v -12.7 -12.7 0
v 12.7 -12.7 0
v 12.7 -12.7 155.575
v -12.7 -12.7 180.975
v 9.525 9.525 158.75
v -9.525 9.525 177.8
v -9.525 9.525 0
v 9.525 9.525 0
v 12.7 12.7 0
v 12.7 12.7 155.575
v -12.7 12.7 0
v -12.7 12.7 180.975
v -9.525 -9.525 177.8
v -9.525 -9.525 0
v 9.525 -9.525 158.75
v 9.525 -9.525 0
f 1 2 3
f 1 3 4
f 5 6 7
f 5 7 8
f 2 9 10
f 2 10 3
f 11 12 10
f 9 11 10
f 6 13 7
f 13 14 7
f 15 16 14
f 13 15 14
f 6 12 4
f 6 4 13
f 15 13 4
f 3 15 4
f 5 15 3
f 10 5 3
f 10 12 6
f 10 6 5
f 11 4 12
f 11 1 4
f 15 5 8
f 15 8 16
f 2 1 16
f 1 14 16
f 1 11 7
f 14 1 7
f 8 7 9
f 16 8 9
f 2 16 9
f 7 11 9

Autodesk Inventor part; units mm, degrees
ref_plane "YZ Plane" through (0, 0, 0) normal (1, 0, 0) x (0, 1, 0)
ref_plane "XZ Plane" through (0, 0, 0) normal (0, 1, 0) x (-1, 0, 0)
ref_plane "XY Plane" through (0, 0, 0) normal (0, 0, 1) x (1, 0, 0)
sketch "Sketch1" plane through (0, 0, 0) normal (0, 0, 1) x (1, 0, 0)
  line L0 (-12.7, 12.7) -> (12.7, 12.7)
  line L1 (12.7, 12.7) -> (12.7, -12.7)
  line L2 (12.7, -12.7) -> (-12.7, -12.7)
  line L3 (-12.7, -12.7) -> (-12.7, 12.7)
  line L4 (-9.525, 9.525) -> (9.525, 9.525)
  line L5 (9.525, 9.525) -> (9.525, -9.525)
  line L6 (9.525, -9.525) -> (-9.525, -9.525)
  line L7 (-9.525, -9.525) -> (-9.525, 9.525)
  point P0 (0, 0)
  dimension "d0" = 25.4
  dimension "d1" = 25.4
  dimension "d2" = 12.7
  dimension "d3" = 12.7
  dimension "d4" = 3.175
  dimension "d5" = 3.175
  dimension "d6" = 3.175
  dimension "d7" = 3.175
extrude "Extrusion1" add sketch "Sketch1" along normal blind 180.975
sketch "Sketch3" plane through (-12.7, 12.7, 0) normal (0, 1, 0) x (1, 0, 0)
  line L0 (0, -180.975) -> (25.4, -180.975) projected
  line L1 (25.4, 0) -> (25.4, -180.975) projected
  line L2 (0, 0) -> (0, -180.975) projected
  line L3 (0, -180.975) -> (25.4, -155.575)
  point P0 (12.7, 0)
  dimension "d13" = 45
extrude "Extrusion3" cut sketch "Sketch3" against normal blind 25.4
properties part number "backwards edge frame tube"
